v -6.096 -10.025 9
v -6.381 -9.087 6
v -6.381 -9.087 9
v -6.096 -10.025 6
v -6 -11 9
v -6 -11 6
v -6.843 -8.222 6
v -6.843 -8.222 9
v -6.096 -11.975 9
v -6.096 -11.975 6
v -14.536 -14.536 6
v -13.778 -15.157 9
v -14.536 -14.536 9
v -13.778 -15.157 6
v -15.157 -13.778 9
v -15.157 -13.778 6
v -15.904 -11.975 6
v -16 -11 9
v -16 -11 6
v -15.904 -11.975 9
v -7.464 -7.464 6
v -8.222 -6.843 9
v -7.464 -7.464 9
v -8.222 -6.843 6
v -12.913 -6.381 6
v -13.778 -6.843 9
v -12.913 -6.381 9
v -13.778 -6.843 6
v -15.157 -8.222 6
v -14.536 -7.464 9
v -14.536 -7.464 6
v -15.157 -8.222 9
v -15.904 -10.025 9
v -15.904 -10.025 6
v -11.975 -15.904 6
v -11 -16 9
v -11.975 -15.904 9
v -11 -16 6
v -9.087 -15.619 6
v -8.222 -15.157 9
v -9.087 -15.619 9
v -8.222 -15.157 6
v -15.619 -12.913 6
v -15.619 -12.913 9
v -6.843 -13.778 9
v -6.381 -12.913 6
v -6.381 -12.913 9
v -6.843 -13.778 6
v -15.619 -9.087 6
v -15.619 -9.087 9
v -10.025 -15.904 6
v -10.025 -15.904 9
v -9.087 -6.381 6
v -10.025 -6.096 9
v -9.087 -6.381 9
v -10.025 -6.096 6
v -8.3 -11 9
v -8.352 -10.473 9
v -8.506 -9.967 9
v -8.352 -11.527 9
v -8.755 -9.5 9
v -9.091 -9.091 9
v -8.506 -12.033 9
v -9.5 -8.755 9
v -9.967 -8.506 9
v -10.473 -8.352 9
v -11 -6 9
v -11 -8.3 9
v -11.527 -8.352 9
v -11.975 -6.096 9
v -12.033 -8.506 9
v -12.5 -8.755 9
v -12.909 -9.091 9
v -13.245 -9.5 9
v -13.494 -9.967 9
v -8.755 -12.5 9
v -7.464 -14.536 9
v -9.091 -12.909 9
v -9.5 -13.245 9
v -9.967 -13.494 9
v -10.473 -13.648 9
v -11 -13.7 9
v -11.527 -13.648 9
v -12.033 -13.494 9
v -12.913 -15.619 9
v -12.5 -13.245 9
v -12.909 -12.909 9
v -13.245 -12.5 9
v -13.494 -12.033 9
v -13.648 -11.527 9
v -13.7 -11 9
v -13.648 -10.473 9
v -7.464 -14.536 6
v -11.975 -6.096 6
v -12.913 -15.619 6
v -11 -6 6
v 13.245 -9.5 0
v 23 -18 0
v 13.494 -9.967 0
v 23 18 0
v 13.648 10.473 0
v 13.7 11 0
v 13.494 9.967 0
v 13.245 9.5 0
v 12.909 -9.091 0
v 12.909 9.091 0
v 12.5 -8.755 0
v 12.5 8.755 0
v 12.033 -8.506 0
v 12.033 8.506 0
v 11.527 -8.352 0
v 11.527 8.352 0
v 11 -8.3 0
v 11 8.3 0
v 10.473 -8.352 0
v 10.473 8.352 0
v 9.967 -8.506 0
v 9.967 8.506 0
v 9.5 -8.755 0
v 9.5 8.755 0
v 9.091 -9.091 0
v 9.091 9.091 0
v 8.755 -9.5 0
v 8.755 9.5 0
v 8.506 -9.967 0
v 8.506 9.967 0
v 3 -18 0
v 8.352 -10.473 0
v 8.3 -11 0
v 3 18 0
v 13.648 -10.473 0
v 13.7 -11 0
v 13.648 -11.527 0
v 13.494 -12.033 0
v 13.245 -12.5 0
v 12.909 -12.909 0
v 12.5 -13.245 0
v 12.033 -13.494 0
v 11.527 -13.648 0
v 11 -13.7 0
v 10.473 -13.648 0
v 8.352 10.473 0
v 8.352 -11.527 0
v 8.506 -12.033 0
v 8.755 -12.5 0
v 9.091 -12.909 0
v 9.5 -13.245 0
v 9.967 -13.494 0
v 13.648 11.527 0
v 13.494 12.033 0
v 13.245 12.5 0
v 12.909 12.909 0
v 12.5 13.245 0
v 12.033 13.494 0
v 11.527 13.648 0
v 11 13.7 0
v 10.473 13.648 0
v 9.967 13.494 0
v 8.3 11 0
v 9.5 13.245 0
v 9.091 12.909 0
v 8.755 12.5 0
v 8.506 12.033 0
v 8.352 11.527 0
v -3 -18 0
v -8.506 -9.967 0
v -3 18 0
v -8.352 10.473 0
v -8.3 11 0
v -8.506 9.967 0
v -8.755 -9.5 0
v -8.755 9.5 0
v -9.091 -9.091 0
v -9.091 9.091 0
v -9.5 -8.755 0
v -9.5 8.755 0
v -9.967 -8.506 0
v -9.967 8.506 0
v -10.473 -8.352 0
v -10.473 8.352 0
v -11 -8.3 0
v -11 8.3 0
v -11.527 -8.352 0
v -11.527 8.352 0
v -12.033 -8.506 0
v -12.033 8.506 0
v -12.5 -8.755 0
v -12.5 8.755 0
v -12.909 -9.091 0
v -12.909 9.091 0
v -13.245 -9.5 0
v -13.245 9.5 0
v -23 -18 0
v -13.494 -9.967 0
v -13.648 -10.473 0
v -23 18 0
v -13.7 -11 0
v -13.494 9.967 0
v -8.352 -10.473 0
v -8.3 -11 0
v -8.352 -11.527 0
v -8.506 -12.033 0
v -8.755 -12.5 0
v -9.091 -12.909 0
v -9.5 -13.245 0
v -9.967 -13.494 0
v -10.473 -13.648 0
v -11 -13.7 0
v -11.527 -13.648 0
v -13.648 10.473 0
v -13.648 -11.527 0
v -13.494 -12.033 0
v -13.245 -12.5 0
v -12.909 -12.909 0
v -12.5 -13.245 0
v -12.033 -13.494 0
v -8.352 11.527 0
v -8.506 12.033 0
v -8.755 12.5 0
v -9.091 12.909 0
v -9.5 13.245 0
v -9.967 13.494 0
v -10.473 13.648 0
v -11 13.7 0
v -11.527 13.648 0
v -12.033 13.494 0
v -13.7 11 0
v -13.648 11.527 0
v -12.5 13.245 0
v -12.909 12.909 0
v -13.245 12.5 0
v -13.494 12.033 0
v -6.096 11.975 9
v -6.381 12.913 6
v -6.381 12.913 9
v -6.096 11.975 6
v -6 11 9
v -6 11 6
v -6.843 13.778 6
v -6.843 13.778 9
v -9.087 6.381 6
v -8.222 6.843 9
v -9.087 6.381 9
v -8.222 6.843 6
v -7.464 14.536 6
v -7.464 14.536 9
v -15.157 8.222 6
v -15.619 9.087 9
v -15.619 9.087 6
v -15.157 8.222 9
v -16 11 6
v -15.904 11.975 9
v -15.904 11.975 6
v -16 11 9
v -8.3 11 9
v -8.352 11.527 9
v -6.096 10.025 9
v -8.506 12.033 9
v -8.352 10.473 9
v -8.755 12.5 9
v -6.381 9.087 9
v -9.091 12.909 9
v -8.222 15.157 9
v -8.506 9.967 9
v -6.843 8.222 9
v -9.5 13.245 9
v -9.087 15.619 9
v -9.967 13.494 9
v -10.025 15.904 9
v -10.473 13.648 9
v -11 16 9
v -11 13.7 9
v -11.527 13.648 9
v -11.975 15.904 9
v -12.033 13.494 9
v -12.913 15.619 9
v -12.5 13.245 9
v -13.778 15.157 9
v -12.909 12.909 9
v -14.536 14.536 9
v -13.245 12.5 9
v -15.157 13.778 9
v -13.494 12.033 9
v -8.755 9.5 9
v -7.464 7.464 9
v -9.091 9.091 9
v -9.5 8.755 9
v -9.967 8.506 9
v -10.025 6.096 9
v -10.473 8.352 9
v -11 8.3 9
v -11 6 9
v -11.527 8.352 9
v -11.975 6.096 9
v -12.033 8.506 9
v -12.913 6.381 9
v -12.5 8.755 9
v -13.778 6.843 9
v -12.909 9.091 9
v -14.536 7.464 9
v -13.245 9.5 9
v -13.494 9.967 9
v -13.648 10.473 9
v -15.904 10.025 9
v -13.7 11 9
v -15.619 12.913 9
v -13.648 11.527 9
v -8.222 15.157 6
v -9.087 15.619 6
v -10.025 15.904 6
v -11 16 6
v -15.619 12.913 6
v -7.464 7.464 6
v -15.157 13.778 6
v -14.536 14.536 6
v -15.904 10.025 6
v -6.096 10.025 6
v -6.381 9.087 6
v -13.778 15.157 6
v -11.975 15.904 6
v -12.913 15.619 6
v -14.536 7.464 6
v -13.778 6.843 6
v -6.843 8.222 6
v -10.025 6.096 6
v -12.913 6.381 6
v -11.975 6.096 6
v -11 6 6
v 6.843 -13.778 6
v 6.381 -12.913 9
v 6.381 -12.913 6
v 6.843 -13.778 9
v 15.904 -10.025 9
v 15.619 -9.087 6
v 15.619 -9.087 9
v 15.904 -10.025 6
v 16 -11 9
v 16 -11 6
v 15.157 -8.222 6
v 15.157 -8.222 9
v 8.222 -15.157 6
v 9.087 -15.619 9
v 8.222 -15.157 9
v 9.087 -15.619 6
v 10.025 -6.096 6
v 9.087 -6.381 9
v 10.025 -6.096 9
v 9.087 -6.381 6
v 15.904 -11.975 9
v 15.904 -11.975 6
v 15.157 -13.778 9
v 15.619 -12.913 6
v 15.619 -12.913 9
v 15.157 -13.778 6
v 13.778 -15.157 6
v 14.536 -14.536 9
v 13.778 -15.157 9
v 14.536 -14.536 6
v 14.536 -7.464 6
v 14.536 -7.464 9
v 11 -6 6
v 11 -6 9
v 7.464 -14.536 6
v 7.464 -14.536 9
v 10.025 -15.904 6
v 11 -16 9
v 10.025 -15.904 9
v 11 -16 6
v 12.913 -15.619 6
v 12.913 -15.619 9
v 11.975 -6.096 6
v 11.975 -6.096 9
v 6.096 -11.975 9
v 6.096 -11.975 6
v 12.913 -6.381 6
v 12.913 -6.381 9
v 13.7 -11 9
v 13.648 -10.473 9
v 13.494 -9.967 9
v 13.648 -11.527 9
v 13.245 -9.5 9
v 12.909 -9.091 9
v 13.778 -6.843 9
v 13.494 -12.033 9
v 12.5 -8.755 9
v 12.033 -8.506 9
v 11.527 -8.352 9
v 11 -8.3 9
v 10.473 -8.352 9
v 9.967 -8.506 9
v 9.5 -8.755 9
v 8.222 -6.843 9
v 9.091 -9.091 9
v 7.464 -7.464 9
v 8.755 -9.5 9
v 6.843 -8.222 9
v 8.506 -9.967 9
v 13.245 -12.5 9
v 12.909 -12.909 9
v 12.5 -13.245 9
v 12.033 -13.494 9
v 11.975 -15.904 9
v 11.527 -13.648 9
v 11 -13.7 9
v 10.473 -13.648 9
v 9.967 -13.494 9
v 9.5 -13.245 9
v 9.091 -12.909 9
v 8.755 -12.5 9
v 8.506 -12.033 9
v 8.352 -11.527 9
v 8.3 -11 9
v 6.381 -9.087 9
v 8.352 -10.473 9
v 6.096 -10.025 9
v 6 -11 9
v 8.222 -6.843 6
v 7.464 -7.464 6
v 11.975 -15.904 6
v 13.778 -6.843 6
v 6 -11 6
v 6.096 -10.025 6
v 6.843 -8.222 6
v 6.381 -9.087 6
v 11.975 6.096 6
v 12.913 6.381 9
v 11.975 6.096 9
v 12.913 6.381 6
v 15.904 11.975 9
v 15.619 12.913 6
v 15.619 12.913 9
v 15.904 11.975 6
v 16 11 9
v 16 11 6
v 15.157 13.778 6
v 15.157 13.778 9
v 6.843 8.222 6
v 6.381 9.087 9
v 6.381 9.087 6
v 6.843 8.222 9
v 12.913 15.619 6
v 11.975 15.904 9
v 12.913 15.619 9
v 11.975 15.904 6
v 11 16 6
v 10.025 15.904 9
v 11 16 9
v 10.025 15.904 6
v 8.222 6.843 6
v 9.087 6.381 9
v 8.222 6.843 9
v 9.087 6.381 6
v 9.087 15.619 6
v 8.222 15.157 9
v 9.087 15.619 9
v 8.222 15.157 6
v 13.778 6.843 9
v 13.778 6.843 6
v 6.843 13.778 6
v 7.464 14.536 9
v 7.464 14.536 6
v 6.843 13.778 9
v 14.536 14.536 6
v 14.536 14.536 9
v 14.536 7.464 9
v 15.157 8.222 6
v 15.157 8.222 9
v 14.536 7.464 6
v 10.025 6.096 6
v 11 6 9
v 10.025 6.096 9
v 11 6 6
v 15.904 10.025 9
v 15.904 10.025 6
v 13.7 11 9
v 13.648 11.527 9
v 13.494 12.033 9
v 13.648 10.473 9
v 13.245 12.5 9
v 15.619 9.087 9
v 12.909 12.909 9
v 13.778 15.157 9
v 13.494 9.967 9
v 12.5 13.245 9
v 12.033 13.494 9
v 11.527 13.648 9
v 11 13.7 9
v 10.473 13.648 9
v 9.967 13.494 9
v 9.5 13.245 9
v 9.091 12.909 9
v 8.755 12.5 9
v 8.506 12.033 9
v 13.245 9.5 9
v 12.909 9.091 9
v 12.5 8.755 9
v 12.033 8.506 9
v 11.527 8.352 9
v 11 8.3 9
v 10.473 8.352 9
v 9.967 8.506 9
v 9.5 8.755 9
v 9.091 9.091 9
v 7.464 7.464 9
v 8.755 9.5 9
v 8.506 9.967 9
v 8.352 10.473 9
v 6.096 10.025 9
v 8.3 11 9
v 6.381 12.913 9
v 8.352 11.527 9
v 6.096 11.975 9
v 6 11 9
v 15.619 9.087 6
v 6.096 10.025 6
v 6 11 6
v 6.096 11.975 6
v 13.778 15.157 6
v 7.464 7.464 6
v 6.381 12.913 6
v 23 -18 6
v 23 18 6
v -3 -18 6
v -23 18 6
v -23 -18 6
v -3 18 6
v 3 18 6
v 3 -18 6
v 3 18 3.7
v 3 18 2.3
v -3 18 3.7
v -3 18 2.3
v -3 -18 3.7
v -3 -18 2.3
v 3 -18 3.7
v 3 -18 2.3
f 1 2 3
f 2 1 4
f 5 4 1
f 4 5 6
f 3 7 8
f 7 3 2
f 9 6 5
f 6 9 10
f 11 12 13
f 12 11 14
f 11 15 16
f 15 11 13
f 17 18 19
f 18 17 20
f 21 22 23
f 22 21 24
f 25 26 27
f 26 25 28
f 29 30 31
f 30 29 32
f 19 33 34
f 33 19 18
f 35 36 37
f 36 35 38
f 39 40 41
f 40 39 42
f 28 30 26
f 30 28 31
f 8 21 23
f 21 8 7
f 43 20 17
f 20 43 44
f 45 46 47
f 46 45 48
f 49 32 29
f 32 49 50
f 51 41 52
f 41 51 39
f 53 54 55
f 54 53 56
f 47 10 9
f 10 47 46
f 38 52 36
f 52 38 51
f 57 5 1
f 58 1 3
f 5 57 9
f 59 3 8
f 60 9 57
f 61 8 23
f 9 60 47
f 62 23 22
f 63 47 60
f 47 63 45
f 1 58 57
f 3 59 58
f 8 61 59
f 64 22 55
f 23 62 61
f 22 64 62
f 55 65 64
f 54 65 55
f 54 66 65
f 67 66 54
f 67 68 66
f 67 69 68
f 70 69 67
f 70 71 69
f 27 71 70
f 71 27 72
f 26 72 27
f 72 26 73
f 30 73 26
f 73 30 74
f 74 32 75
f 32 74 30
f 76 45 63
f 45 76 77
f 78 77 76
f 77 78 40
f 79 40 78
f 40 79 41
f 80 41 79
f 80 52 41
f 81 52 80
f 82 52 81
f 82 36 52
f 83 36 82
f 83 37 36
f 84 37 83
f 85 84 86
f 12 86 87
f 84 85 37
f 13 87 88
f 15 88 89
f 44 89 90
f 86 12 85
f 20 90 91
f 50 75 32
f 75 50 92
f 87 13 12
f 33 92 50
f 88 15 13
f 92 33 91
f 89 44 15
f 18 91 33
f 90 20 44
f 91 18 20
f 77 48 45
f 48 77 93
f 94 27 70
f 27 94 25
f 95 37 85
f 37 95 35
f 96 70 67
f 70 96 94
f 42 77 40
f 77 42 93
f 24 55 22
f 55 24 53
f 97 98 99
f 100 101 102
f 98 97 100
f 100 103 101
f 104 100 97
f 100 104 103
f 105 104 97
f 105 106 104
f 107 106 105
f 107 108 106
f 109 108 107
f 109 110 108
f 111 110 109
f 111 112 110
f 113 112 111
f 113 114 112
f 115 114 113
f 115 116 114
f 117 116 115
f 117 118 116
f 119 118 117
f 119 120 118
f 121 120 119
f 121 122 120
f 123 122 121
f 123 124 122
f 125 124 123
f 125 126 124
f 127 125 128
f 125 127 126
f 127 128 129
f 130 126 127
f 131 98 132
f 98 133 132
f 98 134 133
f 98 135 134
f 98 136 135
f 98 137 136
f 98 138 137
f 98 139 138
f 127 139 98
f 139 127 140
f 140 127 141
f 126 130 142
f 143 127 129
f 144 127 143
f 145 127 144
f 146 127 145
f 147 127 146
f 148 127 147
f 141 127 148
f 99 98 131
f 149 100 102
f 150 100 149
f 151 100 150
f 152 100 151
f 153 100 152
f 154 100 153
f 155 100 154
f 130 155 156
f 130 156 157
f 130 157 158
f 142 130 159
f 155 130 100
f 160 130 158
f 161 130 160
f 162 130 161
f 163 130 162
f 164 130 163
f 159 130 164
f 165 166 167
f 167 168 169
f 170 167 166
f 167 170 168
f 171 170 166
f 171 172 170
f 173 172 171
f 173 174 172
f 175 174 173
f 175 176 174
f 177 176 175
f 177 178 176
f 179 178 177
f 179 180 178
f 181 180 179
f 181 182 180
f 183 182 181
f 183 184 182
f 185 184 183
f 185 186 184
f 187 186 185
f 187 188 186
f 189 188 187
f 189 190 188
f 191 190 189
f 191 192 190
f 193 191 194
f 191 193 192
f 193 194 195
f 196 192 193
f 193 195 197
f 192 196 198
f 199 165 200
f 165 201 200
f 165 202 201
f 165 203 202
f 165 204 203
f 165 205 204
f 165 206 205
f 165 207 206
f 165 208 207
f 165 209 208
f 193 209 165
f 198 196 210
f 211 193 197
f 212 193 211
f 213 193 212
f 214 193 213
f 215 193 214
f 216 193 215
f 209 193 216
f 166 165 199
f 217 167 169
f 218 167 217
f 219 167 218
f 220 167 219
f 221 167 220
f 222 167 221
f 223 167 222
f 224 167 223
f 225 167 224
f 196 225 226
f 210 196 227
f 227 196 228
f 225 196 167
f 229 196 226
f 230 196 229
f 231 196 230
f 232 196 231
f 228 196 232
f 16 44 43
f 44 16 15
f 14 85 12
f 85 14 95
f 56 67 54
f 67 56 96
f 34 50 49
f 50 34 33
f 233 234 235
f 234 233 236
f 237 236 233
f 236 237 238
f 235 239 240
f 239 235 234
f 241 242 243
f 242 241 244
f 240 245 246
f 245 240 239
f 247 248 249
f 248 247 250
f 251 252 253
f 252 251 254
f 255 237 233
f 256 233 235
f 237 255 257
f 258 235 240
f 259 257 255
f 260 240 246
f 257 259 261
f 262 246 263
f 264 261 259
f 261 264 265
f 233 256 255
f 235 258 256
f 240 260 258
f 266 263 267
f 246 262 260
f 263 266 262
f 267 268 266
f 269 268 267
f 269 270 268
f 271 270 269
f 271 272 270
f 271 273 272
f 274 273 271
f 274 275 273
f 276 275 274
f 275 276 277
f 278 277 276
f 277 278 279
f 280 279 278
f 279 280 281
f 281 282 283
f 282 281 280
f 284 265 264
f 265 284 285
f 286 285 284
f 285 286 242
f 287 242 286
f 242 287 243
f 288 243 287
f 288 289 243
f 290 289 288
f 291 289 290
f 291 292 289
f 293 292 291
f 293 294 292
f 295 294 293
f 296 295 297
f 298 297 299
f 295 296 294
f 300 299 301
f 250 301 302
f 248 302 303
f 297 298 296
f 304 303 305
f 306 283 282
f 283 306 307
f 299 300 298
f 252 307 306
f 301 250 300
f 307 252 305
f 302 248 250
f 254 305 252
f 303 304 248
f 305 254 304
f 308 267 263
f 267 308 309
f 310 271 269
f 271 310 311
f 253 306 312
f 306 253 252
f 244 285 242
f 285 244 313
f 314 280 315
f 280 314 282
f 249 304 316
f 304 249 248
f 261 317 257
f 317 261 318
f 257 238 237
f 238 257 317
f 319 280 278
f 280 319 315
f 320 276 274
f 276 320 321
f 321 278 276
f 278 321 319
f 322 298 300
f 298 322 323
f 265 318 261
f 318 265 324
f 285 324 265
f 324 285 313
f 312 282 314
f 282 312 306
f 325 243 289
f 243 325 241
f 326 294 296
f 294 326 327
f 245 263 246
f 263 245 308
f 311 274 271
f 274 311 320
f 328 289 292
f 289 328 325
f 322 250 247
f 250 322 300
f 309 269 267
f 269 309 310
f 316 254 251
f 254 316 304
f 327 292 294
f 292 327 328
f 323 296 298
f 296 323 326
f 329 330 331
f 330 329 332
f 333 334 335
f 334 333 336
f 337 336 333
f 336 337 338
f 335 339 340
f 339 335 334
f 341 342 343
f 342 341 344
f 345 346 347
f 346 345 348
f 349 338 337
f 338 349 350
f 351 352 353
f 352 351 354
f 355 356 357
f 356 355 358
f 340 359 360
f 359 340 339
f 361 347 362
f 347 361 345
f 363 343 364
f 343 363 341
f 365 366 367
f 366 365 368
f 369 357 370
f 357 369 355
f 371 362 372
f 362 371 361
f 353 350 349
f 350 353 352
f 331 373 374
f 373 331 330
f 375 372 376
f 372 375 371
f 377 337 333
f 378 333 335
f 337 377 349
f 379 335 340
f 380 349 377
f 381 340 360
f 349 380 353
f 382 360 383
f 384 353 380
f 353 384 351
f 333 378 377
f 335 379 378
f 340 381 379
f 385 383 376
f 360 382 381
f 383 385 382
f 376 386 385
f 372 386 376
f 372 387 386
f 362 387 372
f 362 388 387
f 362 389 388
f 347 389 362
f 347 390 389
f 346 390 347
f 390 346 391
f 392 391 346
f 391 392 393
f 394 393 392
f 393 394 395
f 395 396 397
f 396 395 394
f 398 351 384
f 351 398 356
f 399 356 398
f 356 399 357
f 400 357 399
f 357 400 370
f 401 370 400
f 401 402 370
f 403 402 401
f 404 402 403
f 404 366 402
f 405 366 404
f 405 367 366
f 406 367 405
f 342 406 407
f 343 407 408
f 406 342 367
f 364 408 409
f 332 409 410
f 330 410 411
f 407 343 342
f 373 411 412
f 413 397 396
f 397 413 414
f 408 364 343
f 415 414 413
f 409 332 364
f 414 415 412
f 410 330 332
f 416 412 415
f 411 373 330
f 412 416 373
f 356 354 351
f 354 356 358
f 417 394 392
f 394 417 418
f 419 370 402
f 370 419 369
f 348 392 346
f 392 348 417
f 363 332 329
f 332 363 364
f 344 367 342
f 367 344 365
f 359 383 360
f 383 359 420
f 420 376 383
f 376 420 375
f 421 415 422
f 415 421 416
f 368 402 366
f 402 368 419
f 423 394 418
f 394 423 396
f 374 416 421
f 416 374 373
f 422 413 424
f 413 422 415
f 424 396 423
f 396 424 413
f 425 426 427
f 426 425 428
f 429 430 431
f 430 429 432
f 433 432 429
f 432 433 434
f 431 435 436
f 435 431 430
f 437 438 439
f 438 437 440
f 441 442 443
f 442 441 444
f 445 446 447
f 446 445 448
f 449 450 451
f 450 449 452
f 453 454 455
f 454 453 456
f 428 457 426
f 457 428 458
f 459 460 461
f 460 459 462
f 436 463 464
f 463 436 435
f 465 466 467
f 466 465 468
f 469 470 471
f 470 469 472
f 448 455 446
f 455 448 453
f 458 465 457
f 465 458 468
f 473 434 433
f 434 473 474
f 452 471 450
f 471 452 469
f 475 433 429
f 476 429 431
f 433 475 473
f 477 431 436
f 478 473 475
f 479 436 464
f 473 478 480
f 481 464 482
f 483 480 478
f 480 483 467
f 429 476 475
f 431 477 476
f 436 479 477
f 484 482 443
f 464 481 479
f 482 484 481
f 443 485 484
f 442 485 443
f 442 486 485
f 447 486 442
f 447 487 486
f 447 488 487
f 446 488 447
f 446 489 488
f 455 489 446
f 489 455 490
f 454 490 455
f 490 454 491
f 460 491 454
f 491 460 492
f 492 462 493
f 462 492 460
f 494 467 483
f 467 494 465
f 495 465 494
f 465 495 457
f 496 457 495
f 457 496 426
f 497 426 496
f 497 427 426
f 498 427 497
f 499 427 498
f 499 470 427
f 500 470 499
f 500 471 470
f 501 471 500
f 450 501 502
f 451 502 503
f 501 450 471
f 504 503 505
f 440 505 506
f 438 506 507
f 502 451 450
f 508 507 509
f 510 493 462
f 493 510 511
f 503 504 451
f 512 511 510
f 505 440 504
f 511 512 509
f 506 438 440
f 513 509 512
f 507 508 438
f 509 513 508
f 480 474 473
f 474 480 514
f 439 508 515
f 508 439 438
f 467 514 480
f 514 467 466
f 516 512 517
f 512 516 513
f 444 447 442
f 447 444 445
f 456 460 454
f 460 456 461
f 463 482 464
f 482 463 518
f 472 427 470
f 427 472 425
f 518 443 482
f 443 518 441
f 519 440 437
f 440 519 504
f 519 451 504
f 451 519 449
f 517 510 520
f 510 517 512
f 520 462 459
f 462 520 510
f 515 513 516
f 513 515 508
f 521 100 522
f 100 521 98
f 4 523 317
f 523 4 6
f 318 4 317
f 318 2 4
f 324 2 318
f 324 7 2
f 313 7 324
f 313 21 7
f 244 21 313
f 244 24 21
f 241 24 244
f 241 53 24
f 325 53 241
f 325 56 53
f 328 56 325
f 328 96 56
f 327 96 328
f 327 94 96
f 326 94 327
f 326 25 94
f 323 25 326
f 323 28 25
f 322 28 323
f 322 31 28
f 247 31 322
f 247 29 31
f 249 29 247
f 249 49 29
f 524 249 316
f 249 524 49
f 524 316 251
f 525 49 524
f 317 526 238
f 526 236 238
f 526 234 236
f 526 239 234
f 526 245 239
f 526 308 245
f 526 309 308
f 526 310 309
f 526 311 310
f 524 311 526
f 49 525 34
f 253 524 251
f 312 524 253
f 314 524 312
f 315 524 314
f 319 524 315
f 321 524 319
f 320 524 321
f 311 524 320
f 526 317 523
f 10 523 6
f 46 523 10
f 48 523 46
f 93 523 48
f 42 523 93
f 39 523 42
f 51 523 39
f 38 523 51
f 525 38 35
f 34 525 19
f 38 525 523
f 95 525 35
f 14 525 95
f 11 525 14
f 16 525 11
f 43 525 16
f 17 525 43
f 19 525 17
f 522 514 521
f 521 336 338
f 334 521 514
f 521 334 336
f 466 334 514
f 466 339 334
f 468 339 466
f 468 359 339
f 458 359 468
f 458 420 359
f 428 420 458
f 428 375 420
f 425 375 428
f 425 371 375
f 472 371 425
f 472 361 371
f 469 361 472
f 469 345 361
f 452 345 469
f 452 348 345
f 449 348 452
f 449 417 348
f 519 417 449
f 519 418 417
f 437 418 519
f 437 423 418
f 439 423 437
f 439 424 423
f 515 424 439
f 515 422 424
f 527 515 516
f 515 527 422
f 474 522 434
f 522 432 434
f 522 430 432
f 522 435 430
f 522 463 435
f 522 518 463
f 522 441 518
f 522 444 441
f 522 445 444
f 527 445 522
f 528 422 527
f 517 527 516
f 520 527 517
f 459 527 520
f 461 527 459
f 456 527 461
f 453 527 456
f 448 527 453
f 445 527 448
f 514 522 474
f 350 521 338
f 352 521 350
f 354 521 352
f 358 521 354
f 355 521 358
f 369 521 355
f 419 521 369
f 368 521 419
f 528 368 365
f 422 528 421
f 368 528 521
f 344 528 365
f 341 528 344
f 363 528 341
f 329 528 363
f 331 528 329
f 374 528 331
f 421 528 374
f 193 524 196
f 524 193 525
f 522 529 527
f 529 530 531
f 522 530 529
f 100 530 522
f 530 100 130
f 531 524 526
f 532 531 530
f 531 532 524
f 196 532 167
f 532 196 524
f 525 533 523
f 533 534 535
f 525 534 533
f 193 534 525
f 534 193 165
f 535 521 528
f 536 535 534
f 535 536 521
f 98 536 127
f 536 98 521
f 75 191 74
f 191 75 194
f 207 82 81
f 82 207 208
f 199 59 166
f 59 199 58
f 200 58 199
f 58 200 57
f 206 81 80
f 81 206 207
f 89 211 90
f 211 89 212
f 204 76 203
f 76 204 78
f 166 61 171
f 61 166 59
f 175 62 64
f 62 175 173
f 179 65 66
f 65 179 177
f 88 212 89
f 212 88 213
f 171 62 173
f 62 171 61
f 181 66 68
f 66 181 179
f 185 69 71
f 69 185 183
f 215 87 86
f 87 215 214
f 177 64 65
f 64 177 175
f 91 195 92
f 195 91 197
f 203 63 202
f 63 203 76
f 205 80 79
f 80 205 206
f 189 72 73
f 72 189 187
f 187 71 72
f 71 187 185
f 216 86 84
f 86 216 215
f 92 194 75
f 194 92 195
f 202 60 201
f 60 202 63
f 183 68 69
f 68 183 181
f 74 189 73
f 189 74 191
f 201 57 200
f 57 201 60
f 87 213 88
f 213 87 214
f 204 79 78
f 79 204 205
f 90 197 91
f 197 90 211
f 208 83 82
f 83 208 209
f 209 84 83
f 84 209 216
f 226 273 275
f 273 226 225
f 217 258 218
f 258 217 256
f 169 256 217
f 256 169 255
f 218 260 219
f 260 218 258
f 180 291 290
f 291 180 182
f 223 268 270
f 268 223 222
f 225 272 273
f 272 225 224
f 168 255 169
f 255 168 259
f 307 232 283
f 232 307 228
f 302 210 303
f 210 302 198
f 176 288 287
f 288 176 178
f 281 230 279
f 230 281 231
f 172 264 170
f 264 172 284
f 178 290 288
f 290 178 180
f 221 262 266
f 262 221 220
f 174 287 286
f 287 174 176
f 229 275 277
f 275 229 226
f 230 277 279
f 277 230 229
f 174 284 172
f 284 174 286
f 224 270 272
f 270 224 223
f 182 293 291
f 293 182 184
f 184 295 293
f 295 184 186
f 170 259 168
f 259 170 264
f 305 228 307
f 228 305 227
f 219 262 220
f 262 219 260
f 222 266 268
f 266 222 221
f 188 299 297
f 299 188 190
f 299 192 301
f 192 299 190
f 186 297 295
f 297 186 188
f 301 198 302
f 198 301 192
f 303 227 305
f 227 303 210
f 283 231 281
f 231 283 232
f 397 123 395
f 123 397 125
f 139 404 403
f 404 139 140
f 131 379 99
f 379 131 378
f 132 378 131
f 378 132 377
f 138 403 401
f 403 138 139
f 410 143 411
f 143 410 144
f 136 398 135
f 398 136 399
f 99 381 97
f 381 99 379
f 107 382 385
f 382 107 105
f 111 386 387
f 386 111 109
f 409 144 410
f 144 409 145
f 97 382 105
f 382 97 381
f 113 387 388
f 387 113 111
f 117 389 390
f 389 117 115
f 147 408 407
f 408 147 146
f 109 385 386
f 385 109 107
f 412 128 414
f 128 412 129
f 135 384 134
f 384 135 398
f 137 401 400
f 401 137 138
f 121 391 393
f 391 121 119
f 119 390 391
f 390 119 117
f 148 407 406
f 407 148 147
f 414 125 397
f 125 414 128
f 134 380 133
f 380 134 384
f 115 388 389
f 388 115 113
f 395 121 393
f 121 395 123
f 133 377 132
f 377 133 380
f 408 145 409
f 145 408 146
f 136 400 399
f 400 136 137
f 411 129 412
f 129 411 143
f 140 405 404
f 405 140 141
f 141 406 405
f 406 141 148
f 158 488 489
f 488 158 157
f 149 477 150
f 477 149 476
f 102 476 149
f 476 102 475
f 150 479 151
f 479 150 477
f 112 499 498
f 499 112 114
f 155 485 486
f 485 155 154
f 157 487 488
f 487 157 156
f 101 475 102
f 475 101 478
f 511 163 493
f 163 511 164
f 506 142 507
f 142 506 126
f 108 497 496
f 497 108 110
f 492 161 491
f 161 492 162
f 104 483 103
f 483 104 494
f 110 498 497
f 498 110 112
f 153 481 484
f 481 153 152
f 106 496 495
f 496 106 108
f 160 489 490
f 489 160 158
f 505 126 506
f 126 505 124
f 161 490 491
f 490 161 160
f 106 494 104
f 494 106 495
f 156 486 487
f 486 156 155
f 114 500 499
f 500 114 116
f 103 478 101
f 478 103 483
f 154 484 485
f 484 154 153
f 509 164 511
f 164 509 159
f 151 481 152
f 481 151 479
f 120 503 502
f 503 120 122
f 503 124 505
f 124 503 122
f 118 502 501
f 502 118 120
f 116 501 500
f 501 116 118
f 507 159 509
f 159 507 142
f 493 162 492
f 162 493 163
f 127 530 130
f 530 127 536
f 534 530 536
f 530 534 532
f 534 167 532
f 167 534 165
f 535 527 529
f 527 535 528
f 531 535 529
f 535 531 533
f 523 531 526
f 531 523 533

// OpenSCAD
$fn = 32;

// ----------------------------------------------------------------------
// Living hinge: 46 x 36 mm plates, 1.4 mm flexible web
// ----------------------------------------------------------------------

// --- parameters (mm) ---
plate_len = 20;           // plate length outside the web
plate_w = 36;             // plate width
thick = 6;                // plate thickness
web_half = 3;             // half width of the flex band
web_t = 1.4;              // flexible web thickness
web_z = 2.3;              // web position inside the thickness
boss_d = 10;              // screw boss diameter
boss_h = 9;               // screw boss height
boss_x = 11;              // screw boss distance from the web
screw_d = 5.4;            // screw hole

difference() {
  union() {
    /* one flat strip, later thinned at the middle */
    translate([-23, -18, 0]) cube([46, 36, 6]);
    /* screw bosses, sunk 0.5 mm into the plates */
    for (sx = [-11, 11]) {
      for (sy = [-11, 11]) {
        translate([sx, sy, 0]) cylinder(h = boss_h, d = boss_d);
      }
    }
  }
  /* channel from below: leaves the web on top of it */
  translate([-3, -20.5, -2.5]) cube([6, 41, 4.8]);
  /* channel from above: thins the web down to web_t */
  translate([-3, -20.5, 3.7]) cube([6, 41, 4.8]);
  /* screw holes through the bosses */
  for (sx = [-11, 11]) {
    for (sy = [-11, 11]) {
      translate([sx, sy, -2.5]) cylinder(h = boss_h + 5, d = screw_d);
    }
  }
}
